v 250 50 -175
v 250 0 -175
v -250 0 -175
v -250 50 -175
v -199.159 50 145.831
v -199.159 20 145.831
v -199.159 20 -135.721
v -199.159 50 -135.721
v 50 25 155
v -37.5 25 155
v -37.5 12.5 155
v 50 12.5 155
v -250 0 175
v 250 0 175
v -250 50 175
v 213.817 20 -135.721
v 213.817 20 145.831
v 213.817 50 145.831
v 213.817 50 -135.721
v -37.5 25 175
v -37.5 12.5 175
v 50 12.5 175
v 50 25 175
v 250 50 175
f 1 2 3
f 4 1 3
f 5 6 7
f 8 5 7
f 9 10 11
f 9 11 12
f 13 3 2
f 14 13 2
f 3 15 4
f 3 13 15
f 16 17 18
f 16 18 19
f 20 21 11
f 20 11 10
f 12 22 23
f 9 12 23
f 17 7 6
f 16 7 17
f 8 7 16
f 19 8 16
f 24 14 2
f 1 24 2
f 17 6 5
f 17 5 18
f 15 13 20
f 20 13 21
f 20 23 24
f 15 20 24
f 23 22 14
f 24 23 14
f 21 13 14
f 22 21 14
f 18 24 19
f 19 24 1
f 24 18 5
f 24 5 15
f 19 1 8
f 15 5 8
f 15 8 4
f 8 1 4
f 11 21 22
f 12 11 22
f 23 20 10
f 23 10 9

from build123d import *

# Parameters (mm, degrees)
SKETCH1_W           = 500
SKETCH1_H           = 350
BOSS_EXTRUDE1_DEPTH = 20
SKETCH2_W           = 412.975976351
SKETCH2_H           = 281.551553033
BOSS_EXTRUDE2_DEPTH = 30
SKETCH3_W           = 87.5
SKETCH3_H           = 12.5
CUT_EXTRUDE2_DEPTH  = 20


with BuildPart() as part:
    # Sketch1 → Boss-Extrude1 (new body)
    with BuildSketch(Plane(origin=(0, 0, 0), x_dir=(1, 0, 0), z_dir=(0, 1, 0))):
        Rectangle(SKETCH1_W, SKETCH1_H)
    extrude(amount=BOSS_EXTRUDE1_DEPTH)

    # Sketch2 → Boss-Extrude2 (add)
    with BuildSketch(Plane(origin=(0, 20, 0), x_dir=(1, 0, 0), z_dir=(0, 1, 0))):
        Polygon((-250, 175), (-199.158549183, 175), (250, 175), (250, 135.720991004), (250, -175), (213.817427168, -175), (-199.158549183, -175), (-250, -175), align=None)
        with Locations((7.329438993, -5.054785513)):
            Rectangle(SKETCH2_W, SKETCH2_H, mode=Mode.SUBTRACT)
    extrude(amount=BOSS_EXTRUDE2_DEPTH)

    # Sketch3 → Cut-Extrude2 (cut)
    with BuildSketch(Plane.XY.offset(175)):
        with Locations((6.25, 18.75)):
            Rectangle(SKETCH3_W, SKETCH3_H)
    extrude(amount=-CUT_EXTRUDE2_DEPTH, mode=Mode.SUBTRACT)


solid = part.part
